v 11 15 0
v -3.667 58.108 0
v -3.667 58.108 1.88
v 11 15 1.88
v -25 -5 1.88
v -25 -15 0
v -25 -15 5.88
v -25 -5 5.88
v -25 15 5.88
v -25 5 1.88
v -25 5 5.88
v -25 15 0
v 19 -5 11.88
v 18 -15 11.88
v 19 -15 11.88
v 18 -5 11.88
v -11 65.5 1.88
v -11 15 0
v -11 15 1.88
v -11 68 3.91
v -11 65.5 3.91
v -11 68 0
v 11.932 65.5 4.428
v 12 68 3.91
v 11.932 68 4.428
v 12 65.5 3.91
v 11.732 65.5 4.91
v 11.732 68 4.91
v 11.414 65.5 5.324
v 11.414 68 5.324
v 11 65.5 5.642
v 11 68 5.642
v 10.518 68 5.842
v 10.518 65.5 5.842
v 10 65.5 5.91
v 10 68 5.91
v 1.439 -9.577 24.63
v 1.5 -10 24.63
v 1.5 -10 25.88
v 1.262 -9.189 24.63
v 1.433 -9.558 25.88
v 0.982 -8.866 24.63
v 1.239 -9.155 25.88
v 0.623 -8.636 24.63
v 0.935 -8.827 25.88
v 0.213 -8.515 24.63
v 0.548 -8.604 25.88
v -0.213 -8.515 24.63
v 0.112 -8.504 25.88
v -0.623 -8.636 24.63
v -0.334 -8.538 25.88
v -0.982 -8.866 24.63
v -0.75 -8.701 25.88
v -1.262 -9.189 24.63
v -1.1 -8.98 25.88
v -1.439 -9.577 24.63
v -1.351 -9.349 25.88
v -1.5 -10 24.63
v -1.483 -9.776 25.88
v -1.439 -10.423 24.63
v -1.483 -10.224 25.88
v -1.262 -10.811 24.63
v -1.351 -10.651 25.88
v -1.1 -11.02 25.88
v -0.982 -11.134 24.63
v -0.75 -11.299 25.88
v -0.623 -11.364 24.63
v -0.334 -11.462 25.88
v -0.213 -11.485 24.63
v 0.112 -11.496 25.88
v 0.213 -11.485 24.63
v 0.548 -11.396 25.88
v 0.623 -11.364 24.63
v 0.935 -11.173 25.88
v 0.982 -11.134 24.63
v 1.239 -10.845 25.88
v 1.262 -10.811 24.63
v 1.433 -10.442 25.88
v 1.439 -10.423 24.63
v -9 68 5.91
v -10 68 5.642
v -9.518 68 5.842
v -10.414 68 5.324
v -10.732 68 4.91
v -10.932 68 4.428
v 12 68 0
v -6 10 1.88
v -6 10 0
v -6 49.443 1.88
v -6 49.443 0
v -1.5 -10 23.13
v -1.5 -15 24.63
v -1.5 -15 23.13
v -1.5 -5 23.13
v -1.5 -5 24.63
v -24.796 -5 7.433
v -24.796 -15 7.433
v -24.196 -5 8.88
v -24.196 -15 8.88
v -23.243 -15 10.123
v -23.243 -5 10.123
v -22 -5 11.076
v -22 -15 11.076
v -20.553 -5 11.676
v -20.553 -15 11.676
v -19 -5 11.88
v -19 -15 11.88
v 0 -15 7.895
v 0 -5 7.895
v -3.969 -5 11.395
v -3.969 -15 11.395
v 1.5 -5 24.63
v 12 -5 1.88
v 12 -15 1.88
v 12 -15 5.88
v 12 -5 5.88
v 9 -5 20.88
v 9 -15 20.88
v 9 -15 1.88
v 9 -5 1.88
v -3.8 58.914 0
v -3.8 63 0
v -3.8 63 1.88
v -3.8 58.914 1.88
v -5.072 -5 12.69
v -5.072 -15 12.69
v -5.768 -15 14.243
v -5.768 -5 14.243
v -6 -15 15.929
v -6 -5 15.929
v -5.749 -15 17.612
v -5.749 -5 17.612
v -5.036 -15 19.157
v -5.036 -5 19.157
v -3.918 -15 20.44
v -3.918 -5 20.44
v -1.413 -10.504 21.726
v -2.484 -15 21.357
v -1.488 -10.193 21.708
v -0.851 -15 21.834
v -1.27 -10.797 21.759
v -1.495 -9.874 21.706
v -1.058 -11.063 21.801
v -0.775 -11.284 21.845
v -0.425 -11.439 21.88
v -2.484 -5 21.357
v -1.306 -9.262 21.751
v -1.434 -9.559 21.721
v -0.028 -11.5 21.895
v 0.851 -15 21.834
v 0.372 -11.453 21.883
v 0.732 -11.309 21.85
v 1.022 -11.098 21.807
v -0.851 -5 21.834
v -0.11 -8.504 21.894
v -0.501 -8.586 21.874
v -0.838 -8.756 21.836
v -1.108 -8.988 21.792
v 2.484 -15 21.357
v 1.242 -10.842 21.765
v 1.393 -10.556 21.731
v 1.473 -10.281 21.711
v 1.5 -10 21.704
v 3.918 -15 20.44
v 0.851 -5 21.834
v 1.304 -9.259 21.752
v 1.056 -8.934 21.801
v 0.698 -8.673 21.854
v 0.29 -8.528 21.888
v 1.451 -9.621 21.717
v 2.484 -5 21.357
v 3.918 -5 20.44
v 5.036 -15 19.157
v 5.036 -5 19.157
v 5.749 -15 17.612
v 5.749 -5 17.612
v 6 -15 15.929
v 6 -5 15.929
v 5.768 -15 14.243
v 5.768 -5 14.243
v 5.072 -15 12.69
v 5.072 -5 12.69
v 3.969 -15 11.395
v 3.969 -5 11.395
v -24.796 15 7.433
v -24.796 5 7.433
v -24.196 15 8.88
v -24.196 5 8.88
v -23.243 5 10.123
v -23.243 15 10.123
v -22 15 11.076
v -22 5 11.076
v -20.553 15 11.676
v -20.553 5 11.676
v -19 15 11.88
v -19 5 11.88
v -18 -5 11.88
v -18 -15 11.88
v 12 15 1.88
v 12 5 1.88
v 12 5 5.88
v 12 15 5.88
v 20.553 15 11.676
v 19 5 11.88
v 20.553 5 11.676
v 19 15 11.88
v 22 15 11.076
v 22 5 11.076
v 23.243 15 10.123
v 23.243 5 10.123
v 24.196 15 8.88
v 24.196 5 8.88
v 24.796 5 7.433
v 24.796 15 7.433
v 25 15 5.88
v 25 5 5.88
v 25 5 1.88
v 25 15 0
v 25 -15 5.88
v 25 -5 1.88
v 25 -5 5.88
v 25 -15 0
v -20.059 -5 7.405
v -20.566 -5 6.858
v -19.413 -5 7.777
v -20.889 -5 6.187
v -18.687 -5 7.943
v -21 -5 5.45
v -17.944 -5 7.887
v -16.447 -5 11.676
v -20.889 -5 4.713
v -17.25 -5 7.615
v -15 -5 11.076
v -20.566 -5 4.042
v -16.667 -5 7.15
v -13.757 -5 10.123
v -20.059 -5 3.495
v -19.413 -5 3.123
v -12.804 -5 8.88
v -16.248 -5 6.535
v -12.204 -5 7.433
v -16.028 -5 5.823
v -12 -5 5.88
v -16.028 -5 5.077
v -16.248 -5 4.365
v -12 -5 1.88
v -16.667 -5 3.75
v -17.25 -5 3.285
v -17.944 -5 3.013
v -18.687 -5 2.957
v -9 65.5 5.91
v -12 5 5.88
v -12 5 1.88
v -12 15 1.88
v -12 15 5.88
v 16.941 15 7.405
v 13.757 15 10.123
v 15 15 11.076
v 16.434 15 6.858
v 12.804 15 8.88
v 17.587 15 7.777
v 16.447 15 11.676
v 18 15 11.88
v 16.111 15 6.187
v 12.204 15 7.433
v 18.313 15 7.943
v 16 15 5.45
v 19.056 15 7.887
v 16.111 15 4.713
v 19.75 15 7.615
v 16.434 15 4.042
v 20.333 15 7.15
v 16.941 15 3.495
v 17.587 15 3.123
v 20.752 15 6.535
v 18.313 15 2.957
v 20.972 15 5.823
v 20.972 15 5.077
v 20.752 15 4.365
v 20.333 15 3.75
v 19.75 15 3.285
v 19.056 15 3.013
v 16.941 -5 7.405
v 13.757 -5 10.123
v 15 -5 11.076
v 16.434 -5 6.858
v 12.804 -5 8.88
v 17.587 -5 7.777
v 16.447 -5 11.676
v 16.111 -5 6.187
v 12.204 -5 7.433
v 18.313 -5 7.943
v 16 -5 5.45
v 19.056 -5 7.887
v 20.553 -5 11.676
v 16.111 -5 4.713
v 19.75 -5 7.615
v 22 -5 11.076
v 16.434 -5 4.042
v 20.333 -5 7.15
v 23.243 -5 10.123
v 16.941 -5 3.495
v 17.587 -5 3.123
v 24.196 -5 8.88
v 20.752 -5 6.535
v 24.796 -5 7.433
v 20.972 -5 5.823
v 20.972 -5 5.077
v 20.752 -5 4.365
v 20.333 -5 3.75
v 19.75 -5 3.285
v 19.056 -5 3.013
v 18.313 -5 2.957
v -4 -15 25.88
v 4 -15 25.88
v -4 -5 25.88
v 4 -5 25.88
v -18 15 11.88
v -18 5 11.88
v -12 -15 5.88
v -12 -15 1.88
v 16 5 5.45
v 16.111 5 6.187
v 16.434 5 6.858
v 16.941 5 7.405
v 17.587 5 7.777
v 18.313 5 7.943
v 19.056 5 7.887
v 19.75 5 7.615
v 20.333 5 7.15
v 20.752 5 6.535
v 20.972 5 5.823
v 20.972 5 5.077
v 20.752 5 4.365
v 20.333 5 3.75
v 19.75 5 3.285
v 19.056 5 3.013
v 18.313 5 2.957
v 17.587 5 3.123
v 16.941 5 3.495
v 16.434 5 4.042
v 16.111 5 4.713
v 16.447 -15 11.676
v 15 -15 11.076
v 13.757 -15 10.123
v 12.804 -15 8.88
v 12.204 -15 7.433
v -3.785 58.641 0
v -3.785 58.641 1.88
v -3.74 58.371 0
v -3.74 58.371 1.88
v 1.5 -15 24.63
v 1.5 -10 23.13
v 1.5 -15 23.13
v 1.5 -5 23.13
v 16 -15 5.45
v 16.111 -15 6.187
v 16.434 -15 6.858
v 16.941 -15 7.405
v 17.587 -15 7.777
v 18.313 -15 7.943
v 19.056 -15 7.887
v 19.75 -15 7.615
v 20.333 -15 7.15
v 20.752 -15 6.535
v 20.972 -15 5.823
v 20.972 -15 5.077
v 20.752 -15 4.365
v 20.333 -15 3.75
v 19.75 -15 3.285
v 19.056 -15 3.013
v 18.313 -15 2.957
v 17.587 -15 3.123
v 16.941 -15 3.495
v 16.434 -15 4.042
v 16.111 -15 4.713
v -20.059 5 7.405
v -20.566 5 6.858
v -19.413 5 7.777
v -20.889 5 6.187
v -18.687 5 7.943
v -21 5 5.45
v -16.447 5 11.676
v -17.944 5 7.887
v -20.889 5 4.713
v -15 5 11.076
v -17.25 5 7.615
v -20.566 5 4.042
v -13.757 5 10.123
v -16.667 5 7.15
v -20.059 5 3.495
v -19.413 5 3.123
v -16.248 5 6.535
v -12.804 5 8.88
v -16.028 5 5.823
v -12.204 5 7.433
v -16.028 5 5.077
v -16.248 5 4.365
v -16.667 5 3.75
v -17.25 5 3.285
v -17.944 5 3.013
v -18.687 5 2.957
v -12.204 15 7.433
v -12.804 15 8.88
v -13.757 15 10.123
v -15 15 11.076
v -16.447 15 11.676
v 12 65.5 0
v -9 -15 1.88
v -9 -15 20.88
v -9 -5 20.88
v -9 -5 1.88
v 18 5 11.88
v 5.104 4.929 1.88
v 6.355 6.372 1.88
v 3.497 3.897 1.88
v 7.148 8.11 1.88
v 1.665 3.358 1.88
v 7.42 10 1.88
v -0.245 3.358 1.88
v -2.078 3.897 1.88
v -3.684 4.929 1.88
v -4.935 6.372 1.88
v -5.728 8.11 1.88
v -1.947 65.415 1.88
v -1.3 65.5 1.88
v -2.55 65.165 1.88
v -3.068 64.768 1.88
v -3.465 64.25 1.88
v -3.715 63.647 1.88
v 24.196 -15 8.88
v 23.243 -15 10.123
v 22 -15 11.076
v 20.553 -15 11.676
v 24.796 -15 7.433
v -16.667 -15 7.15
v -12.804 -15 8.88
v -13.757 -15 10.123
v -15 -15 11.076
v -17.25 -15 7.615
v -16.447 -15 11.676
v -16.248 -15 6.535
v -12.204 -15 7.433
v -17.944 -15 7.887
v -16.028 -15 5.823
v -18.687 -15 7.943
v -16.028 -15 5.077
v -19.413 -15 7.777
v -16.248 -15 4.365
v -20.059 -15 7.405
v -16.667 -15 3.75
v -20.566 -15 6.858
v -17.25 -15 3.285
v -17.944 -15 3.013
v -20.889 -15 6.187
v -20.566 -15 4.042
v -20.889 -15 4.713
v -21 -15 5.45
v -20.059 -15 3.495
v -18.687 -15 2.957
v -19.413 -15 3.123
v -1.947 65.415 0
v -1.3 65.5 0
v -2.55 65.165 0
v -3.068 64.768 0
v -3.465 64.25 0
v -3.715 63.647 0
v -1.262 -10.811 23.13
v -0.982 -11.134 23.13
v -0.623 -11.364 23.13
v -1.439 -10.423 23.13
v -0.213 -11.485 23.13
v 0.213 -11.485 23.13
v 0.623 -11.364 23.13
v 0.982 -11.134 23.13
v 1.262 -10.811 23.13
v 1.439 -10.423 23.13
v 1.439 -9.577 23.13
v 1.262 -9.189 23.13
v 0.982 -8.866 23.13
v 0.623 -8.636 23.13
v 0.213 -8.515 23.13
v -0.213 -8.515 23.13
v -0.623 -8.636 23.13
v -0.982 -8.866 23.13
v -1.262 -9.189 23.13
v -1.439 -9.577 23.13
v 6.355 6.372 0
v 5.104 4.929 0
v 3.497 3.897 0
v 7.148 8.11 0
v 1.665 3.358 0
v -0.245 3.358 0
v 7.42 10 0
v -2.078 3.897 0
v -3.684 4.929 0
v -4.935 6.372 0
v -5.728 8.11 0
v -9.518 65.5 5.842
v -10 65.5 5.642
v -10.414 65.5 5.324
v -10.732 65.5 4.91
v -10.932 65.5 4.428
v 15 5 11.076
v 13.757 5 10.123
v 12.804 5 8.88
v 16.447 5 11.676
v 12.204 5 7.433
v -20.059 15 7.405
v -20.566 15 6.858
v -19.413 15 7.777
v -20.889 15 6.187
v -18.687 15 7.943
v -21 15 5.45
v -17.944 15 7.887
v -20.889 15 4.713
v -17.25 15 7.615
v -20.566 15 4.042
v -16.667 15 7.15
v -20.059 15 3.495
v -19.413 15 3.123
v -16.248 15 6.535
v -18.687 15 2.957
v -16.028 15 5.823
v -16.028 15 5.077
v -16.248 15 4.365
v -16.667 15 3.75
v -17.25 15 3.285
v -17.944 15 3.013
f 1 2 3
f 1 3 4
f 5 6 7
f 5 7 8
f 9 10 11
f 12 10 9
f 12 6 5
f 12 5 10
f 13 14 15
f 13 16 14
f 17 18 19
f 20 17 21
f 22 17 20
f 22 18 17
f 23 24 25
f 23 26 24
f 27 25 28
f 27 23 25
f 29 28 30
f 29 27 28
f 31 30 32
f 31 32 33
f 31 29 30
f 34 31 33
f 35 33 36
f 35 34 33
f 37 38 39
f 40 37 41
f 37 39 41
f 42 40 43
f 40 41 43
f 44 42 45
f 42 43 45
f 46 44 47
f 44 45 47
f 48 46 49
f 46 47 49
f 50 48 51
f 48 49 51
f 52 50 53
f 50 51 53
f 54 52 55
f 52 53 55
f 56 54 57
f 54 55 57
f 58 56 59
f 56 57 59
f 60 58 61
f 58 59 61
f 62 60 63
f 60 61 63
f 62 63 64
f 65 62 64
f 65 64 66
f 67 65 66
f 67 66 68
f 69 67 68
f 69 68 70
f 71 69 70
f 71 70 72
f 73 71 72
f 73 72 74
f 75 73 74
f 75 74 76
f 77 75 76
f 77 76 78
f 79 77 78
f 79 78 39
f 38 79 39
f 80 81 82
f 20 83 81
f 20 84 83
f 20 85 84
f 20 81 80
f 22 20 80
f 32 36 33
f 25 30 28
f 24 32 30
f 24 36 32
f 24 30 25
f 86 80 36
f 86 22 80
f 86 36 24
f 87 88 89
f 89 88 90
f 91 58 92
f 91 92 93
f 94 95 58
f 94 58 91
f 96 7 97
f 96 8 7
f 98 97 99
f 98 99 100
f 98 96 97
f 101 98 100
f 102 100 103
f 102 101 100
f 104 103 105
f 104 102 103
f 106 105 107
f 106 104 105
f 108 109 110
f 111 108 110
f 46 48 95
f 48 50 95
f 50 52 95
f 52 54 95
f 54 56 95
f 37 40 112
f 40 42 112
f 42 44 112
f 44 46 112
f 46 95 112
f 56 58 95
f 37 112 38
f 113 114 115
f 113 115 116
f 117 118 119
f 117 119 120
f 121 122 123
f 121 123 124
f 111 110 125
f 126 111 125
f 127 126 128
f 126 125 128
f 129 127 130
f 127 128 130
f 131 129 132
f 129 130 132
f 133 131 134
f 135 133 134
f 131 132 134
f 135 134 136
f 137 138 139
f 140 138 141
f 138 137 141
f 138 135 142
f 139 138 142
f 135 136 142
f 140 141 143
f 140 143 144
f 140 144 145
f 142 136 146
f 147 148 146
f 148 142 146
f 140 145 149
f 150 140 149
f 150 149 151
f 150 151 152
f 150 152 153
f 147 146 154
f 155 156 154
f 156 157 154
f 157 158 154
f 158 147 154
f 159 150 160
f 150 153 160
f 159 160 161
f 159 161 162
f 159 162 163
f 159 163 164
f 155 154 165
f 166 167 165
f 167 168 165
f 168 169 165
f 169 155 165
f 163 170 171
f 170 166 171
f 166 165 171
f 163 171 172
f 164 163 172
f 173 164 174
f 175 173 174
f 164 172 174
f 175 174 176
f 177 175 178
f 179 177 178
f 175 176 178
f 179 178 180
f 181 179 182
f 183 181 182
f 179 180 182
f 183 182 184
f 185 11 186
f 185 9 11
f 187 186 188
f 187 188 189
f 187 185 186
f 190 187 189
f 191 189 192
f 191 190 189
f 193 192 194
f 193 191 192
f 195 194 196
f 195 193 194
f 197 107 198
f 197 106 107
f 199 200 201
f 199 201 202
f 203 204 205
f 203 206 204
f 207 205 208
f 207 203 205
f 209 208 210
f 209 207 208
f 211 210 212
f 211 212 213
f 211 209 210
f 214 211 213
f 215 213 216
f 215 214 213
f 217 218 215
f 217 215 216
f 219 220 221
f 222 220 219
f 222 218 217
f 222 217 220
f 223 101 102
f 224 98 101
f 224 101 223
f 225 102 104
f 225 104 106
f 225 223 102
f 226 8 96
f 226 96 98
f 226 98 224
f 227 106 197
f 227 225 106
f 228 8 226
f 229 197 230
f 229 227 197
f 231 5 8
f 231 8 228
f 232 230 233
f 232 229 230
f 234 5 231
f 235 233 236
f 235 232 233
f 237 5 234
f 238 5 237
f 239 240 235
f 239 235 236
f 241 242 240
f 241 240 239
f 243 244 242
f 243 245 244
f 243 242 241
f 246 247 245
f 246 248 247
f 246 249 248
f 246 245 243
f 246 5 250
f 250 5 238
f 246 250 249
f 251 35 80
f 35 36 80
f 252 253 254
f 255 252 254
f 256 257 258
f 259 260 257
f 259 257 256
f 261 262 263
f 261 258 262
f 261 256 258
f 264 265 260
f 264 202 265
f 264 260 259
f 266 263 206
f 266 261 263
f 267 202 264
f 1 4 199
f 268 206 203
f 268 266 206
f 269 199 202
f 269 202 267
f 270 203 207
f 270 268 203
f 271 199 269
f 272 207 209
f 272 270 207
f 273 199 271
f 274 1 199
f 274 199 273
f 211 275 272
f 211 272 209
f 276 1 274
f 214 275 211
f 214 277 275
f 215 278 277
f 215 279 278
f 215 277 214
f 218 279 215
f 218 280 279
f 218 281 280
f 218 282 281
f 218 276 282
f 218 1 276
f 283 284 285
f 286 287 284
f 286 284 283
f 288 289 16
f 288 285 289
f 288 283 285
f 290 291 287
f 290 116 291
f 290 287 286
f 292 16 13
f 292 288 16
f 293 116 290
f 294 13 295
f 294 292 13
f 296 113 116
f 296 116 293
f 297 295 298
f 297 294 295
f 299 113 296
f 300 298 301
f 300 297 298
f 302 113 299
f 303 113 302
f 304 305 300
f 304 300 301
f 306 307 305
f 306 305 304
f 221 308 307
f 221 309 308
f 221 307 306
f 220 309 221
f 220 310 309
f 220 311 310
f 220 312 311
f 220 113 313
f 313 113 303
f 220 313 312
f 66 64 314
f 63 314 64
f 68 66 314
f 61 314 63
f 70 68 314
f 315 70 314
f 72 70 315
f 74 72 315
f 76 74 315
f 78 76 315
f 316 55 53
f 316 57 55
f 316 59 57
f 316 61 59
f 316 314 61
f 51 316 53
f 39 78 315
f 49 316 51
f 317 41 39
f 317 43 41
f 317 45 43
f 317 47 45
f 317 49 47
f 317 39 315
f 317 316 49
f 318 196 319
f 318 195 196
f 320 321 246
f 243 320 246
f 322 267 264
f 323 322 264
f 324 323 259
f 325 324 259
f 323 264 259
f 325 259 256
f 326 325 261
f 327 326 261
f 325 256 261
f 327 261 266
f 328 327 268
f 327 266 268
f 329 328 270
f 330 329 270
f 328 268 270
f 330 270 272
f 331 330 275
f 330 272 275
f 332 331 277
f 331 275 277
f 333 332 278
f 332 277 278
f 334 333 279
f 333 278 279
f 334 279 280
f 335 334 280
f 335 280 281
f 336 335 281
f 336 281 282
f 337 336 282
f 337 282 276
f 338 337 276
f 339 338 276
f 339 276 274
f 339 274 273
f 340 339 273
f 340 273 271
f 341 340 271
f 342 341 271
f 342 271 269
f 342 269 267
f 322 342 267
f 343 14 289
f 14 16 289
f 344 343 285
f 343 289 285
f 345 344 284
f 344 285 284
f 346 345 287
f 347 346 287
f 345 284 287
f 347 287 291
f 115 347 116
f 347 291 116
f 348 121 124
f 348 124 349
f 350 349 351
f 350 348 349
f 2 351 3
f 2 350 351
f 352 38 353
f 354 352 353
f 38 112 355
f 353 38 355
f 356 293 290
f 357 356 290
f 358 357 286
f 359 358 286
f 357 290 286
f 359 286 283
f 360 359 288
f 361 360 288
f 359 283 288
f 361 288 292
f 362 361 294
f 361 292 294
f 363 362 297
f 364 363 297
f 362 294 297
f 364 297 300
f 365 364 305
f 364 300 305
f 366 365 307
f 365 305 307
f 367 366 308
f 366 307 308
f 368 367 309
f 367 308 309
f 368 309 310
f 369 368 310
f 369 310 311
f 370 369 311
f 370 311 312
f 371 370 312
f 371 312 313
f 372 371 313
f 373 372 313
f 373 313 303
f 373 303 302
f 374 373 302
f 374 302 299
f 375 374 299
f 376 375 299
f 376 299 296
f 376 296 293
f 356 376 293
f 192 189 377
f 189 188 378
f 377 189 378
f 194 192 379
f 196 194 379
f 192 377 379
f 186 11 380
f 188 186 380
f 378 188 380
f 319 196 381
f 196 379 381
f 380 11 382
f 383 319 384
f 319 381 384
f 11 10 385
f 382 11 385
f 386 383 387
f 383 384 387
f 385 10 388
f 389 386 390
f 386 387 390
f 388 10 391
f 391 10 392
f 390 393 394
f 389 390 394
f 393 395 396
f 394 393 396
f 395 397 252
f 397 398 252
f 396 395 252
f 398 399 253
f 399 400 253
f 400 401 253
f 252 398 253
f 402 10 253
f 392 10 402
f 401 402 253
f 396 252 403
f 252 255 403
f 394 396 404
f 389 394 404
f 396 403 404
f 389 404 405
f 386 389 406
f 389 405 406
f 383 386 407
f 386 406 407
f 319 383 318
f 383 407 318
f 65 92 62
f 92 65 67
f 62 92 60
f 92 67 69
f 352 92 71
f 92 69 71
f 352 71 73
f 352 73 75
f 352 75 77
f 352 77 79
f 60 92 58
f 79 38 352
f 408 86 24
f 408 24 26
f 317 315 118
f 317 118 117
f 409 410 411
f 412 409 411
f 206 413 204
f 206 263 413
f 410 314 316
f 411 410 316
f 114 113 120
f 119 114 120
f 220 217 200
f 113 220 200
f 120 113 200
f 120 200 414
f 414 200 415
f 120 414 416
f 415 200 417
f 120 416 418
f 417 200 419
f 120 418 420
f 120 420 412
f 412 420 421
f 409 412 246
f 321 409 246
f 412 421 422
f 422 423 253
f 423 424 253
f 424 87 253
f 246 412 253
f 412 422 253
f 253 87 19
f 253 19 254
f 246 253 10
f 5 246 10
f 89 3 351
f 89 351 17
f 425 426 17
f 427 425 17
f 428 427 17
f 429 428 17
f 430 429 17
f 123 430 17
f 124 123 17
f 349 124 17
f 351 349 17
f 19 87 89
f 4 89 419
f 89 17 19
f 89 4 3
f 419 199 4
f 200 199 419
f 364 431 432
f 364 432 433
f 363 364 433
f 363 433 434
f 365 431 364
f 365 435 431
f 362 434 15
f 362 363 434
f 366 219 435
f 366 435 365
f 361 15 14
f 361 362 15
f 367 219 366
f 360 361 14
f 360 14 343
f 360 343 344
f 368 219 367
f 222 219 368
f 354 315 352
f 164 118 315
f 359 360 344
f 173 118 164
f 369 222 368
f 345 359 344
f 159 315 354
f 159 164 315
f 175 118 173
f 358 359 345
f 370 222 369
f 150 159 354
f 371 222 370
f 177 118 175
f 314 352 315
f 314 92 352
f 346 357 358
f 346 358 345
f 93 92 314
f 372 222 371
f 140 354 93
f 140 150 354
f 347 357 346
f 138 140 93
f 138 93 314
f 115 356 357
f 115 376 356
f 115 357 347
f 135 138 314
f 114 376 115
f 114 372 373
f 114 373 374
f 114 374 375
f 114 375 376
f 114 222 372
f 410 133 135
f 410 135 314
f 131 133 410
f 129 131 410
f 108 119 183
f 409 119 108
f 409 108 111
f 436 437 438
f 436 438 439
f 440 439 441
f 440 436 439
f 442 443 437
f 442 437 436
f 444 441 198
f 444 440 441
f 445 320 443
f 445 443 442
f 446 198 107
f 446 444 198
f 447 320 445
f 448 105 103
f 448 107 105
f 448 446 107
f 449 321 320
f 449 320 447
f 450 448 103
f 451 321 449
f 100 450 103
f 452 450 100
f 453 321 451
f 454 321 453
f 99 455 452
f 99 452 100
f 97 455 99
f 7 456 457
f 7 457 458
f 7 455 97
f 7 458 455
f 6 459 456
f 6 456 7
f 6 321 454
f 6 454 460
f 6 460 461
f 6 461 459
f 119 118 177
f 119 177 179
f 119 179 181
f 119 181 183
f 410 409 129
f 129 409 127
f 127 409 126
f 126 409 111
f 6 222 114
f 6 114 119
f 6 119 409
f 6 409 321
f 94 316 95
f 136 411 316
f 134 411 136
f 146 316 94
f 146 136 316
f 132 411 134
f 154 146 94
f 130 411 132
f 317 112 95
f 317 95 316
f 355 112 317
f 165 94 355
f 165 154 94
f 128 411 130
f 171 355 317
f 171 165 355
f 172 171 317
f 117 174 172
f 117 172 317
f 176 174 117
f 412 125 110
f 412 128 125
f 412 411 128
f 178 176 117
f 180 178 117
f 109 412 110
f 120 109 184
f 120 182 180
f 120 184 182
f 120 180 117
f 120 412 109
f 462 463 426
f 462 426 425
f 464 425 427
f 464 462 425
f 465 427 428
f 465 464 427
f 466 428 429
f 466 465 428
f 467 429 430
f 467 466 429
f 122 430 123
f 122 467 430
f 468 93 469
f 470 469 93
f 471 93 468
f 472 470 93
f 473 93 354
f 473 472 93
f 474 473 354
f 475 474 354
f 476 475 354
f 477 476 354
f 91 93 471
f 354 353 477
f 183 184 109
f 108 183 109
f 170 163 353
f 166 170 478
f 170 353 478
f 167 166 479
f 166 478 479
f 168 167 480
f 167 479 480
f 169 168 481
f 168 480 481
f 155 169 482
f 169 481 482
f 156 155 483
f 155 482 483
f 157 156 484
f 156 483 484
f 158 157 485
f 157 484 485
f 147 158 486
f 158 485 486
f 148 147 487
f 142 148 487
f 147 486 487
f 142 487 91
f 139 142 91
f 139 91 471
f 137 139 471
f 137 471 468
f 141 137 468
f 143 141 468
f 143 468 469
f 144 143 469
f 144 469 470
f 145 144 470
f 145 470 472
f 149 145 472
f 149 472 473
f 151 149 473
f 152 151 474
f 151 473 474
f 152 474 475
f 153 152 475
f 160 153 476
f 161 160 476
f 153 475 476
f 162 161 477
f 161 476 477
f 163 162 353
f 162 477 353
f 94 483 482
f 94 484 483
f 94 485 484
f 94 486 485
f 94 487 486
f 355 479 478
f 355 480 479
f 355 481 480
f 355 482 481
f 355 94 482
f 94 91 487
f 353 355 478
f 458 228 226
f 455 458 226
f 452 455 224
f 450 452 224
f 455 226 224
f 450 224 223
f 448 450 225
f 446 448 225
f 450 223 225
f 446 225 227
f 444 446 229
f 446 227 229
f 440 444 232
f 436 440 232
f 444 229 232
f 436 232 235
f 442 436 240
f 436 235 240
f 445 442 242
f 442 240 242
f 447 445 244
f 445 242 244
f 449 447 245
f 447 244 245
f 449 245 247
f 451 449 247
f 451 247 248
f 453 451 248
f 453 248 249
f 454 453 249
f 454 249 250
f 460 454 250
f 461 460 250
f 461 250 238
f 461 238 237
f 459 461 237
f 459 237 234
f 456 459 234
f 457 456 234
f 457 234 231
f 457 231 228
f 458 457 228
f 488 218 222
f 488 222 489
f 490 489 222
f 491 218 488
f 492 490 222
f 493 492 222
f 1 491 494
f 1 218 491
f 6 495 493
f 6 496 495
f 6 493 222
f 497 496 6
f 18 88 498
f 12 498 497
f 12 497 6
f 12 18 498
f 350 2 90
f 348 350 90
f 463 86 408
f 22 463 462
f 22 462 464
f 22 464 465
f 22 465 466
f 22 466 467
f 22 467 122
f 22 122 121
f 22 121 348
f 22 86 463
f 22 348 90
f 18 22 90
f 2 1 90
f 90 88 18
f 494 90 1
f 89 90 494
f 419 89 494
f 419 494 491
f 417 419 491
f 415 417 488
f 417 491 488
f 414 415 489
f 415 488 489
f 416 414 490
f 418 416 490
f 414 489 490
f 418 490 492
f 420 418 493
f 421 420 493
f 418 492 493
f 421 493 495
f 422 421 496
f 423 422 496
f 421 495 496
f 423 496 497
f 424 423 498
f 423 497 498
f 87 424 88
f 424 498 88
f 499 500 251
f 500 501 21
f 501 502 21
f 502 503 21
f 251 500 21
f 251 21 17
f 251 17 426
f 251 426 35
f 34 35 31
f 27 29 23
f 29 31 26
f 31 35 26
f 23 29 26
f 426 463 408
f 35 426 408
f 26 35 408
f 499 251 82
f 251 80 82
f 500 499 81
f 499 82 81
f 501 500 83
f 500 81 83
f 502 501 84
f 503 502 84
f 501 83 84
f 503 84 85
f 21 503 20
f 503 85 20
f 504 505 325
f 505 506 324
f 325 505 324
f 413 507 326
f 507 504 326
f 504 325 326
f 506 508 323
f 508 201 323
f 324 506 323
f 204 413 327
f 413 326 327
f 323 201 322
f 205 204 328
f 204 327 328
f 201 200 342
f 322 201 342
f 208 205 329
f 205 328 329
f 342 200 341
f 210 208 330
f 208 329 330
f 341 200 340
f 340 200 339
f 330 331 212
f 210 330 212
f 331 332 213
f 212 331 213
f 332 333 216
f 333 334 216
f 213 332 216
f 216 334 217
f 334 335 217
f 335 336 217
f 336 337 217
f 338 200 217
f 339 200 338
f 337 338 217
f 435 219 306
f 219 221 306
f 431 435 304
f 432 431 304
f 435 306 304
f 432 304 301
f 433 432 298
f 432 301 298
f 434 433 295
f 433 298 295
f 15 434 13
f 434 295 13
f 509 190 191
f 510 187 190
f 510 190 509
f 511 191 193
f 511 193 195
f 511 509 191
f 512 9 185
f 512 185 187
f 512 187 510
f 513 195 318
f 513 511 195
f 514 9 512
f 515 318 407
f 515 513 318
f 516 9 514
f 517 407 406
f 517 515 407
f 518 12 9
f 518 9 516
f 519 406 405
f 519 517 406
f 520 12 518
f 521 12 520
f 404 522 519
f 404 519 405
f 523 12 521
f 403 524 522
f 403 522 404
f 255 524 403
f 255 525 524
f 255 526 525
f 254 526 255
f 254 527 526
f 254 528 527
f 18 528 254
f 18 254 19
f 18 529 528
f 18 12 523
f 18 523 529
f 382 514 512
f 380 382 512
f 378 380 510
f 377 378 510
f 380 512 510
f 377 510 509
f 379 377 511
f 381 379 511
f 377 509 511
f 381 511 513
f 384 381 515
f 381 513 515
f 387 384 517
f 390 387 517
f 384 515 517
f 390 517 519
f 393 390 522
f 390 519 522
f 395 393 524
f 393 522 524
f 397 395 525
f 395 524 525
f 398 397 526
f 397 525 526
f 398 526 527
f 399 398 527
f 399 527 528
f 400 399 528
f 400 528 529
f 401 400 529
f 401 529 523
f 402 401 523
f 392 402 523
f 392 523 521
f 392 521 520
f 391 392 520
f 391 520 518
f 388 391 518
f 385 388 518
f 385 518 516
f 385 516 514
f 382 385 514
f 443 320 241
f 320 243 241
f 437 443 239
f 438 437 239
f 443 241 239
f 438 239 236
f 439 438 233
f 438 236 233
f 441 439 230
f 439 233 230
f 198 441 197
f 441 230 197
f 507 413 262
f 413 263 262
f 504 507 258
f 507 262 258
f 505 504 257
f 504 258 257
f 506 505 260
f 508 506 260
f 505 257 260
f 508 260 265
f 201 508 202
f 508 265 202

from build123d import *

# Parameters (mm, degrees)
SALIENTE_EXTRUIR1_DEPTH = 1.88
SALIENTE_EXTRUIR2_DEPTH = 4.03
REDONDEO1_R             = 2
CROQUIS3_W              = 13
CROQUIS3_H              = 10
SALIENTE_EXTRUIR3_DEPTH = 10
REDONDEO2_R             = 6
CROQUIS4_W              = 18
CROQUIS4_H              = 10
SALIENTE_EXTRUIR4_DEPTH = 24
CHAFL_N1_SIZE           = 5
CORTAR_EXTRUIR1_DEPTH   = 24
CROQUIS6_R              = 1.5
CORTAR_EXTRUIR2_DEPTH   = 14
CROQUIS7_W              = 3
CROQUIS7_H              = 1.5
CORTAR_EXTRUIR3_DEPTH   = 14
CROQUIS8_R              = 2.5
CORTAR_EXTRUIR4_DEPTH   = 65.060708707


with BuildPart() as part:
    # Croquis1 → Saliente-Extruir1 (new body)
    with BuildSketch(Plane.XY):
        with BuildLine():
            Line((-11, 15), (-11, 68))
            Line((-11, 68), (12, 68))
            Line((12, 68), (12, 65.5))
            Line((12, 65.5), (-1.3, 65.5))
            ThreePointArc((-1.3, 65.5), (-3.067766953, 64.767766953), (-3.8, 63))
            Line((-3.8, 63), (-3.8, 58.913644565))
            ThreePointArc((-3.8, 58.913644565), (-3.7664666, 58.505548363), (-3.666765992, 58.108400044))
            Line((-3.666765992, 58.108400044), (11, 15))
            Line((11, 15), (25, 15))
            Line((25, 15), (25, -15))
            Line((25, -15), (-25, -15))
            Line((-25, -15), (-25, 15))
            Line((-25, 15), (-11, 15))
        make_face()
        with BuildLine():
            Line((-6, 10), (-6, 49.44298114))
            Line((-6, 49.44298114), (7.419680939, 10))
            ThreePointArc((7.419680939, 10), (0.70984047, 3.29015953), (-6, 10))
        make_face(mode=Mode.SUBTRACT)
    extrude(amount=SALIENTE_EXTRUIR1_DEPTH)

    # Croquis2 → Saliente-Extruir2 (add)
    with BuildSketch(Plane.XY.offset(1.88)):
        Polygon((-1.3, 65.5), (-11, 65.5), (-11, 68), (12, 68), (12, 65.5), align=None)
    extrude(amount=SALIENTE_EXTRUIR2_DEPTH)

    # Redondeo1
    redondeo1_edges = [part.edges().sort_by_distance(p)[0] for p in [
        (-11, 66.75, 5.91),
        (12, 66.75, 5.91),
    ]]
    fillet(redondeo1_edges, radius=REDONDEO1_R)

    # Croquis3 → Saliente-Extruir3 (add)
    with BuildSketch(Plane.XY.offset(1.88)):
        with Locations((-18.5, 10)):
            Rectangle(CROQUIS3_W, CROQUIS3_H)
        with Locations((-18.5, -10)):
            Rectangle(CROQUIS3_W, CROQUIS3_H)
        with Locations((18.5, -10)):
            Rectangle(CROQUIS3_W, CROQUIS3_H)
        with Locations((18.5, 10)):
            Rectangle(CROQUIS3_W, CROQUIS3_H)
    extrude(amount=SALIENTE_EXTRUIR3_DEPTH)

    # Redondeo2
    redondeo2_edges = [part.edges().sort_by_distance(p)[0] for p in [
        (25, -10, 11.88),
        (12, -10, 11.88),
        (25, 10, 11.88),
        (12, 10, 11.88),
        (-25, 10, 11.88),
        (-12, 10, 11.88),
        (-25, -10, 11.88),
        (-12, -10, 11.88),
    ]]
    fillet(redondeo2_edges, radius=REDONDEO2_R)

    # Croquis4 → Saliente-Extruir4 (add)
    with BuildSketch(Plane.XY.offset(1.88)):
        with Locations((0, -10)):
            Rectangle(CROQUIS4_W, CROQUIS4_H)
    extrude(amount=SALIENTE_EXTRUIR4_DEPTH)

    # Chaflán1
    chafl_n1_edges = [part.edges().sort_by_distance(p)[0] for p in [
        (9, -10, 25.88),
        (-9, -10, 25.88),
    ]]
    chamfer(chafl_n1_edges, length=CHAFL_N1_SIZE)

    # Croquis5 → Cortar-Extruir1 (cut)
    with BuildSketch(Plane(origin=(0, -5, 0), x_dir=(1, 0, 0), z_dir=(0, 1, 0))):
        with BuildLine():
            Line((0, -7.895), (-3.968626967, -11.395))
            ThreePointArc((-3.968626967, -11.395), (0, -21.895), (3.968626967, -11.395))
            Line((3.968626967, -11.395), (0, -7.895))
        make_face()
    extrude(amount=-CORTAR_EXTRUIR1_DEPTH, mode=Mode.SUBTRACT)

    # Croquis6 → Cortar-Extruir2 (cut)
    with BuildSketch(Plane.XY.offset(25.88)):
        with Locations((0, -10)):
            Circle(CROQUIS6_R)
    extrude(amount=-CORTAR_EXTRUIR2_DEPTH, mode=Mode.SUBTRACT)

    # Croquis7 → Cortar-Extruir3 (cut)
    with BuildSketch(Plane(origin=(0, -5, 0), x_dir=(1, 0, 0), z_dir=(0, 1, 0))):
        with Locations((0, -23.88)):
            Rectangle(CROQUIS7_W, CROQUIS7_H)
    extrude(amount=-CORTAR_EXTRUIR3_DEPTH, mode=Mode.SUBTRACT)

    # Croquis8 → Cortar-Extruir4 (cut, through all)
    with BuildSketch(Plane(origin=(0, 15, 0), x_dir=(1, 0, 0), z_dir=(0, 1, 0))):
        with Locations(Location((-18.5, -5.45, 0), (0, 0, 180))):
            Circle(CROQUIS8_R)
        with Locations(Location((18.5, -5.45, 0), (0, 0, 180))):
            Circle(CROQUIS8_R)
    extrude(amount=-CORTAR_EXTRUIR4_DEPTH, mode=Mode.SUBTRACT)


solid = part.part
